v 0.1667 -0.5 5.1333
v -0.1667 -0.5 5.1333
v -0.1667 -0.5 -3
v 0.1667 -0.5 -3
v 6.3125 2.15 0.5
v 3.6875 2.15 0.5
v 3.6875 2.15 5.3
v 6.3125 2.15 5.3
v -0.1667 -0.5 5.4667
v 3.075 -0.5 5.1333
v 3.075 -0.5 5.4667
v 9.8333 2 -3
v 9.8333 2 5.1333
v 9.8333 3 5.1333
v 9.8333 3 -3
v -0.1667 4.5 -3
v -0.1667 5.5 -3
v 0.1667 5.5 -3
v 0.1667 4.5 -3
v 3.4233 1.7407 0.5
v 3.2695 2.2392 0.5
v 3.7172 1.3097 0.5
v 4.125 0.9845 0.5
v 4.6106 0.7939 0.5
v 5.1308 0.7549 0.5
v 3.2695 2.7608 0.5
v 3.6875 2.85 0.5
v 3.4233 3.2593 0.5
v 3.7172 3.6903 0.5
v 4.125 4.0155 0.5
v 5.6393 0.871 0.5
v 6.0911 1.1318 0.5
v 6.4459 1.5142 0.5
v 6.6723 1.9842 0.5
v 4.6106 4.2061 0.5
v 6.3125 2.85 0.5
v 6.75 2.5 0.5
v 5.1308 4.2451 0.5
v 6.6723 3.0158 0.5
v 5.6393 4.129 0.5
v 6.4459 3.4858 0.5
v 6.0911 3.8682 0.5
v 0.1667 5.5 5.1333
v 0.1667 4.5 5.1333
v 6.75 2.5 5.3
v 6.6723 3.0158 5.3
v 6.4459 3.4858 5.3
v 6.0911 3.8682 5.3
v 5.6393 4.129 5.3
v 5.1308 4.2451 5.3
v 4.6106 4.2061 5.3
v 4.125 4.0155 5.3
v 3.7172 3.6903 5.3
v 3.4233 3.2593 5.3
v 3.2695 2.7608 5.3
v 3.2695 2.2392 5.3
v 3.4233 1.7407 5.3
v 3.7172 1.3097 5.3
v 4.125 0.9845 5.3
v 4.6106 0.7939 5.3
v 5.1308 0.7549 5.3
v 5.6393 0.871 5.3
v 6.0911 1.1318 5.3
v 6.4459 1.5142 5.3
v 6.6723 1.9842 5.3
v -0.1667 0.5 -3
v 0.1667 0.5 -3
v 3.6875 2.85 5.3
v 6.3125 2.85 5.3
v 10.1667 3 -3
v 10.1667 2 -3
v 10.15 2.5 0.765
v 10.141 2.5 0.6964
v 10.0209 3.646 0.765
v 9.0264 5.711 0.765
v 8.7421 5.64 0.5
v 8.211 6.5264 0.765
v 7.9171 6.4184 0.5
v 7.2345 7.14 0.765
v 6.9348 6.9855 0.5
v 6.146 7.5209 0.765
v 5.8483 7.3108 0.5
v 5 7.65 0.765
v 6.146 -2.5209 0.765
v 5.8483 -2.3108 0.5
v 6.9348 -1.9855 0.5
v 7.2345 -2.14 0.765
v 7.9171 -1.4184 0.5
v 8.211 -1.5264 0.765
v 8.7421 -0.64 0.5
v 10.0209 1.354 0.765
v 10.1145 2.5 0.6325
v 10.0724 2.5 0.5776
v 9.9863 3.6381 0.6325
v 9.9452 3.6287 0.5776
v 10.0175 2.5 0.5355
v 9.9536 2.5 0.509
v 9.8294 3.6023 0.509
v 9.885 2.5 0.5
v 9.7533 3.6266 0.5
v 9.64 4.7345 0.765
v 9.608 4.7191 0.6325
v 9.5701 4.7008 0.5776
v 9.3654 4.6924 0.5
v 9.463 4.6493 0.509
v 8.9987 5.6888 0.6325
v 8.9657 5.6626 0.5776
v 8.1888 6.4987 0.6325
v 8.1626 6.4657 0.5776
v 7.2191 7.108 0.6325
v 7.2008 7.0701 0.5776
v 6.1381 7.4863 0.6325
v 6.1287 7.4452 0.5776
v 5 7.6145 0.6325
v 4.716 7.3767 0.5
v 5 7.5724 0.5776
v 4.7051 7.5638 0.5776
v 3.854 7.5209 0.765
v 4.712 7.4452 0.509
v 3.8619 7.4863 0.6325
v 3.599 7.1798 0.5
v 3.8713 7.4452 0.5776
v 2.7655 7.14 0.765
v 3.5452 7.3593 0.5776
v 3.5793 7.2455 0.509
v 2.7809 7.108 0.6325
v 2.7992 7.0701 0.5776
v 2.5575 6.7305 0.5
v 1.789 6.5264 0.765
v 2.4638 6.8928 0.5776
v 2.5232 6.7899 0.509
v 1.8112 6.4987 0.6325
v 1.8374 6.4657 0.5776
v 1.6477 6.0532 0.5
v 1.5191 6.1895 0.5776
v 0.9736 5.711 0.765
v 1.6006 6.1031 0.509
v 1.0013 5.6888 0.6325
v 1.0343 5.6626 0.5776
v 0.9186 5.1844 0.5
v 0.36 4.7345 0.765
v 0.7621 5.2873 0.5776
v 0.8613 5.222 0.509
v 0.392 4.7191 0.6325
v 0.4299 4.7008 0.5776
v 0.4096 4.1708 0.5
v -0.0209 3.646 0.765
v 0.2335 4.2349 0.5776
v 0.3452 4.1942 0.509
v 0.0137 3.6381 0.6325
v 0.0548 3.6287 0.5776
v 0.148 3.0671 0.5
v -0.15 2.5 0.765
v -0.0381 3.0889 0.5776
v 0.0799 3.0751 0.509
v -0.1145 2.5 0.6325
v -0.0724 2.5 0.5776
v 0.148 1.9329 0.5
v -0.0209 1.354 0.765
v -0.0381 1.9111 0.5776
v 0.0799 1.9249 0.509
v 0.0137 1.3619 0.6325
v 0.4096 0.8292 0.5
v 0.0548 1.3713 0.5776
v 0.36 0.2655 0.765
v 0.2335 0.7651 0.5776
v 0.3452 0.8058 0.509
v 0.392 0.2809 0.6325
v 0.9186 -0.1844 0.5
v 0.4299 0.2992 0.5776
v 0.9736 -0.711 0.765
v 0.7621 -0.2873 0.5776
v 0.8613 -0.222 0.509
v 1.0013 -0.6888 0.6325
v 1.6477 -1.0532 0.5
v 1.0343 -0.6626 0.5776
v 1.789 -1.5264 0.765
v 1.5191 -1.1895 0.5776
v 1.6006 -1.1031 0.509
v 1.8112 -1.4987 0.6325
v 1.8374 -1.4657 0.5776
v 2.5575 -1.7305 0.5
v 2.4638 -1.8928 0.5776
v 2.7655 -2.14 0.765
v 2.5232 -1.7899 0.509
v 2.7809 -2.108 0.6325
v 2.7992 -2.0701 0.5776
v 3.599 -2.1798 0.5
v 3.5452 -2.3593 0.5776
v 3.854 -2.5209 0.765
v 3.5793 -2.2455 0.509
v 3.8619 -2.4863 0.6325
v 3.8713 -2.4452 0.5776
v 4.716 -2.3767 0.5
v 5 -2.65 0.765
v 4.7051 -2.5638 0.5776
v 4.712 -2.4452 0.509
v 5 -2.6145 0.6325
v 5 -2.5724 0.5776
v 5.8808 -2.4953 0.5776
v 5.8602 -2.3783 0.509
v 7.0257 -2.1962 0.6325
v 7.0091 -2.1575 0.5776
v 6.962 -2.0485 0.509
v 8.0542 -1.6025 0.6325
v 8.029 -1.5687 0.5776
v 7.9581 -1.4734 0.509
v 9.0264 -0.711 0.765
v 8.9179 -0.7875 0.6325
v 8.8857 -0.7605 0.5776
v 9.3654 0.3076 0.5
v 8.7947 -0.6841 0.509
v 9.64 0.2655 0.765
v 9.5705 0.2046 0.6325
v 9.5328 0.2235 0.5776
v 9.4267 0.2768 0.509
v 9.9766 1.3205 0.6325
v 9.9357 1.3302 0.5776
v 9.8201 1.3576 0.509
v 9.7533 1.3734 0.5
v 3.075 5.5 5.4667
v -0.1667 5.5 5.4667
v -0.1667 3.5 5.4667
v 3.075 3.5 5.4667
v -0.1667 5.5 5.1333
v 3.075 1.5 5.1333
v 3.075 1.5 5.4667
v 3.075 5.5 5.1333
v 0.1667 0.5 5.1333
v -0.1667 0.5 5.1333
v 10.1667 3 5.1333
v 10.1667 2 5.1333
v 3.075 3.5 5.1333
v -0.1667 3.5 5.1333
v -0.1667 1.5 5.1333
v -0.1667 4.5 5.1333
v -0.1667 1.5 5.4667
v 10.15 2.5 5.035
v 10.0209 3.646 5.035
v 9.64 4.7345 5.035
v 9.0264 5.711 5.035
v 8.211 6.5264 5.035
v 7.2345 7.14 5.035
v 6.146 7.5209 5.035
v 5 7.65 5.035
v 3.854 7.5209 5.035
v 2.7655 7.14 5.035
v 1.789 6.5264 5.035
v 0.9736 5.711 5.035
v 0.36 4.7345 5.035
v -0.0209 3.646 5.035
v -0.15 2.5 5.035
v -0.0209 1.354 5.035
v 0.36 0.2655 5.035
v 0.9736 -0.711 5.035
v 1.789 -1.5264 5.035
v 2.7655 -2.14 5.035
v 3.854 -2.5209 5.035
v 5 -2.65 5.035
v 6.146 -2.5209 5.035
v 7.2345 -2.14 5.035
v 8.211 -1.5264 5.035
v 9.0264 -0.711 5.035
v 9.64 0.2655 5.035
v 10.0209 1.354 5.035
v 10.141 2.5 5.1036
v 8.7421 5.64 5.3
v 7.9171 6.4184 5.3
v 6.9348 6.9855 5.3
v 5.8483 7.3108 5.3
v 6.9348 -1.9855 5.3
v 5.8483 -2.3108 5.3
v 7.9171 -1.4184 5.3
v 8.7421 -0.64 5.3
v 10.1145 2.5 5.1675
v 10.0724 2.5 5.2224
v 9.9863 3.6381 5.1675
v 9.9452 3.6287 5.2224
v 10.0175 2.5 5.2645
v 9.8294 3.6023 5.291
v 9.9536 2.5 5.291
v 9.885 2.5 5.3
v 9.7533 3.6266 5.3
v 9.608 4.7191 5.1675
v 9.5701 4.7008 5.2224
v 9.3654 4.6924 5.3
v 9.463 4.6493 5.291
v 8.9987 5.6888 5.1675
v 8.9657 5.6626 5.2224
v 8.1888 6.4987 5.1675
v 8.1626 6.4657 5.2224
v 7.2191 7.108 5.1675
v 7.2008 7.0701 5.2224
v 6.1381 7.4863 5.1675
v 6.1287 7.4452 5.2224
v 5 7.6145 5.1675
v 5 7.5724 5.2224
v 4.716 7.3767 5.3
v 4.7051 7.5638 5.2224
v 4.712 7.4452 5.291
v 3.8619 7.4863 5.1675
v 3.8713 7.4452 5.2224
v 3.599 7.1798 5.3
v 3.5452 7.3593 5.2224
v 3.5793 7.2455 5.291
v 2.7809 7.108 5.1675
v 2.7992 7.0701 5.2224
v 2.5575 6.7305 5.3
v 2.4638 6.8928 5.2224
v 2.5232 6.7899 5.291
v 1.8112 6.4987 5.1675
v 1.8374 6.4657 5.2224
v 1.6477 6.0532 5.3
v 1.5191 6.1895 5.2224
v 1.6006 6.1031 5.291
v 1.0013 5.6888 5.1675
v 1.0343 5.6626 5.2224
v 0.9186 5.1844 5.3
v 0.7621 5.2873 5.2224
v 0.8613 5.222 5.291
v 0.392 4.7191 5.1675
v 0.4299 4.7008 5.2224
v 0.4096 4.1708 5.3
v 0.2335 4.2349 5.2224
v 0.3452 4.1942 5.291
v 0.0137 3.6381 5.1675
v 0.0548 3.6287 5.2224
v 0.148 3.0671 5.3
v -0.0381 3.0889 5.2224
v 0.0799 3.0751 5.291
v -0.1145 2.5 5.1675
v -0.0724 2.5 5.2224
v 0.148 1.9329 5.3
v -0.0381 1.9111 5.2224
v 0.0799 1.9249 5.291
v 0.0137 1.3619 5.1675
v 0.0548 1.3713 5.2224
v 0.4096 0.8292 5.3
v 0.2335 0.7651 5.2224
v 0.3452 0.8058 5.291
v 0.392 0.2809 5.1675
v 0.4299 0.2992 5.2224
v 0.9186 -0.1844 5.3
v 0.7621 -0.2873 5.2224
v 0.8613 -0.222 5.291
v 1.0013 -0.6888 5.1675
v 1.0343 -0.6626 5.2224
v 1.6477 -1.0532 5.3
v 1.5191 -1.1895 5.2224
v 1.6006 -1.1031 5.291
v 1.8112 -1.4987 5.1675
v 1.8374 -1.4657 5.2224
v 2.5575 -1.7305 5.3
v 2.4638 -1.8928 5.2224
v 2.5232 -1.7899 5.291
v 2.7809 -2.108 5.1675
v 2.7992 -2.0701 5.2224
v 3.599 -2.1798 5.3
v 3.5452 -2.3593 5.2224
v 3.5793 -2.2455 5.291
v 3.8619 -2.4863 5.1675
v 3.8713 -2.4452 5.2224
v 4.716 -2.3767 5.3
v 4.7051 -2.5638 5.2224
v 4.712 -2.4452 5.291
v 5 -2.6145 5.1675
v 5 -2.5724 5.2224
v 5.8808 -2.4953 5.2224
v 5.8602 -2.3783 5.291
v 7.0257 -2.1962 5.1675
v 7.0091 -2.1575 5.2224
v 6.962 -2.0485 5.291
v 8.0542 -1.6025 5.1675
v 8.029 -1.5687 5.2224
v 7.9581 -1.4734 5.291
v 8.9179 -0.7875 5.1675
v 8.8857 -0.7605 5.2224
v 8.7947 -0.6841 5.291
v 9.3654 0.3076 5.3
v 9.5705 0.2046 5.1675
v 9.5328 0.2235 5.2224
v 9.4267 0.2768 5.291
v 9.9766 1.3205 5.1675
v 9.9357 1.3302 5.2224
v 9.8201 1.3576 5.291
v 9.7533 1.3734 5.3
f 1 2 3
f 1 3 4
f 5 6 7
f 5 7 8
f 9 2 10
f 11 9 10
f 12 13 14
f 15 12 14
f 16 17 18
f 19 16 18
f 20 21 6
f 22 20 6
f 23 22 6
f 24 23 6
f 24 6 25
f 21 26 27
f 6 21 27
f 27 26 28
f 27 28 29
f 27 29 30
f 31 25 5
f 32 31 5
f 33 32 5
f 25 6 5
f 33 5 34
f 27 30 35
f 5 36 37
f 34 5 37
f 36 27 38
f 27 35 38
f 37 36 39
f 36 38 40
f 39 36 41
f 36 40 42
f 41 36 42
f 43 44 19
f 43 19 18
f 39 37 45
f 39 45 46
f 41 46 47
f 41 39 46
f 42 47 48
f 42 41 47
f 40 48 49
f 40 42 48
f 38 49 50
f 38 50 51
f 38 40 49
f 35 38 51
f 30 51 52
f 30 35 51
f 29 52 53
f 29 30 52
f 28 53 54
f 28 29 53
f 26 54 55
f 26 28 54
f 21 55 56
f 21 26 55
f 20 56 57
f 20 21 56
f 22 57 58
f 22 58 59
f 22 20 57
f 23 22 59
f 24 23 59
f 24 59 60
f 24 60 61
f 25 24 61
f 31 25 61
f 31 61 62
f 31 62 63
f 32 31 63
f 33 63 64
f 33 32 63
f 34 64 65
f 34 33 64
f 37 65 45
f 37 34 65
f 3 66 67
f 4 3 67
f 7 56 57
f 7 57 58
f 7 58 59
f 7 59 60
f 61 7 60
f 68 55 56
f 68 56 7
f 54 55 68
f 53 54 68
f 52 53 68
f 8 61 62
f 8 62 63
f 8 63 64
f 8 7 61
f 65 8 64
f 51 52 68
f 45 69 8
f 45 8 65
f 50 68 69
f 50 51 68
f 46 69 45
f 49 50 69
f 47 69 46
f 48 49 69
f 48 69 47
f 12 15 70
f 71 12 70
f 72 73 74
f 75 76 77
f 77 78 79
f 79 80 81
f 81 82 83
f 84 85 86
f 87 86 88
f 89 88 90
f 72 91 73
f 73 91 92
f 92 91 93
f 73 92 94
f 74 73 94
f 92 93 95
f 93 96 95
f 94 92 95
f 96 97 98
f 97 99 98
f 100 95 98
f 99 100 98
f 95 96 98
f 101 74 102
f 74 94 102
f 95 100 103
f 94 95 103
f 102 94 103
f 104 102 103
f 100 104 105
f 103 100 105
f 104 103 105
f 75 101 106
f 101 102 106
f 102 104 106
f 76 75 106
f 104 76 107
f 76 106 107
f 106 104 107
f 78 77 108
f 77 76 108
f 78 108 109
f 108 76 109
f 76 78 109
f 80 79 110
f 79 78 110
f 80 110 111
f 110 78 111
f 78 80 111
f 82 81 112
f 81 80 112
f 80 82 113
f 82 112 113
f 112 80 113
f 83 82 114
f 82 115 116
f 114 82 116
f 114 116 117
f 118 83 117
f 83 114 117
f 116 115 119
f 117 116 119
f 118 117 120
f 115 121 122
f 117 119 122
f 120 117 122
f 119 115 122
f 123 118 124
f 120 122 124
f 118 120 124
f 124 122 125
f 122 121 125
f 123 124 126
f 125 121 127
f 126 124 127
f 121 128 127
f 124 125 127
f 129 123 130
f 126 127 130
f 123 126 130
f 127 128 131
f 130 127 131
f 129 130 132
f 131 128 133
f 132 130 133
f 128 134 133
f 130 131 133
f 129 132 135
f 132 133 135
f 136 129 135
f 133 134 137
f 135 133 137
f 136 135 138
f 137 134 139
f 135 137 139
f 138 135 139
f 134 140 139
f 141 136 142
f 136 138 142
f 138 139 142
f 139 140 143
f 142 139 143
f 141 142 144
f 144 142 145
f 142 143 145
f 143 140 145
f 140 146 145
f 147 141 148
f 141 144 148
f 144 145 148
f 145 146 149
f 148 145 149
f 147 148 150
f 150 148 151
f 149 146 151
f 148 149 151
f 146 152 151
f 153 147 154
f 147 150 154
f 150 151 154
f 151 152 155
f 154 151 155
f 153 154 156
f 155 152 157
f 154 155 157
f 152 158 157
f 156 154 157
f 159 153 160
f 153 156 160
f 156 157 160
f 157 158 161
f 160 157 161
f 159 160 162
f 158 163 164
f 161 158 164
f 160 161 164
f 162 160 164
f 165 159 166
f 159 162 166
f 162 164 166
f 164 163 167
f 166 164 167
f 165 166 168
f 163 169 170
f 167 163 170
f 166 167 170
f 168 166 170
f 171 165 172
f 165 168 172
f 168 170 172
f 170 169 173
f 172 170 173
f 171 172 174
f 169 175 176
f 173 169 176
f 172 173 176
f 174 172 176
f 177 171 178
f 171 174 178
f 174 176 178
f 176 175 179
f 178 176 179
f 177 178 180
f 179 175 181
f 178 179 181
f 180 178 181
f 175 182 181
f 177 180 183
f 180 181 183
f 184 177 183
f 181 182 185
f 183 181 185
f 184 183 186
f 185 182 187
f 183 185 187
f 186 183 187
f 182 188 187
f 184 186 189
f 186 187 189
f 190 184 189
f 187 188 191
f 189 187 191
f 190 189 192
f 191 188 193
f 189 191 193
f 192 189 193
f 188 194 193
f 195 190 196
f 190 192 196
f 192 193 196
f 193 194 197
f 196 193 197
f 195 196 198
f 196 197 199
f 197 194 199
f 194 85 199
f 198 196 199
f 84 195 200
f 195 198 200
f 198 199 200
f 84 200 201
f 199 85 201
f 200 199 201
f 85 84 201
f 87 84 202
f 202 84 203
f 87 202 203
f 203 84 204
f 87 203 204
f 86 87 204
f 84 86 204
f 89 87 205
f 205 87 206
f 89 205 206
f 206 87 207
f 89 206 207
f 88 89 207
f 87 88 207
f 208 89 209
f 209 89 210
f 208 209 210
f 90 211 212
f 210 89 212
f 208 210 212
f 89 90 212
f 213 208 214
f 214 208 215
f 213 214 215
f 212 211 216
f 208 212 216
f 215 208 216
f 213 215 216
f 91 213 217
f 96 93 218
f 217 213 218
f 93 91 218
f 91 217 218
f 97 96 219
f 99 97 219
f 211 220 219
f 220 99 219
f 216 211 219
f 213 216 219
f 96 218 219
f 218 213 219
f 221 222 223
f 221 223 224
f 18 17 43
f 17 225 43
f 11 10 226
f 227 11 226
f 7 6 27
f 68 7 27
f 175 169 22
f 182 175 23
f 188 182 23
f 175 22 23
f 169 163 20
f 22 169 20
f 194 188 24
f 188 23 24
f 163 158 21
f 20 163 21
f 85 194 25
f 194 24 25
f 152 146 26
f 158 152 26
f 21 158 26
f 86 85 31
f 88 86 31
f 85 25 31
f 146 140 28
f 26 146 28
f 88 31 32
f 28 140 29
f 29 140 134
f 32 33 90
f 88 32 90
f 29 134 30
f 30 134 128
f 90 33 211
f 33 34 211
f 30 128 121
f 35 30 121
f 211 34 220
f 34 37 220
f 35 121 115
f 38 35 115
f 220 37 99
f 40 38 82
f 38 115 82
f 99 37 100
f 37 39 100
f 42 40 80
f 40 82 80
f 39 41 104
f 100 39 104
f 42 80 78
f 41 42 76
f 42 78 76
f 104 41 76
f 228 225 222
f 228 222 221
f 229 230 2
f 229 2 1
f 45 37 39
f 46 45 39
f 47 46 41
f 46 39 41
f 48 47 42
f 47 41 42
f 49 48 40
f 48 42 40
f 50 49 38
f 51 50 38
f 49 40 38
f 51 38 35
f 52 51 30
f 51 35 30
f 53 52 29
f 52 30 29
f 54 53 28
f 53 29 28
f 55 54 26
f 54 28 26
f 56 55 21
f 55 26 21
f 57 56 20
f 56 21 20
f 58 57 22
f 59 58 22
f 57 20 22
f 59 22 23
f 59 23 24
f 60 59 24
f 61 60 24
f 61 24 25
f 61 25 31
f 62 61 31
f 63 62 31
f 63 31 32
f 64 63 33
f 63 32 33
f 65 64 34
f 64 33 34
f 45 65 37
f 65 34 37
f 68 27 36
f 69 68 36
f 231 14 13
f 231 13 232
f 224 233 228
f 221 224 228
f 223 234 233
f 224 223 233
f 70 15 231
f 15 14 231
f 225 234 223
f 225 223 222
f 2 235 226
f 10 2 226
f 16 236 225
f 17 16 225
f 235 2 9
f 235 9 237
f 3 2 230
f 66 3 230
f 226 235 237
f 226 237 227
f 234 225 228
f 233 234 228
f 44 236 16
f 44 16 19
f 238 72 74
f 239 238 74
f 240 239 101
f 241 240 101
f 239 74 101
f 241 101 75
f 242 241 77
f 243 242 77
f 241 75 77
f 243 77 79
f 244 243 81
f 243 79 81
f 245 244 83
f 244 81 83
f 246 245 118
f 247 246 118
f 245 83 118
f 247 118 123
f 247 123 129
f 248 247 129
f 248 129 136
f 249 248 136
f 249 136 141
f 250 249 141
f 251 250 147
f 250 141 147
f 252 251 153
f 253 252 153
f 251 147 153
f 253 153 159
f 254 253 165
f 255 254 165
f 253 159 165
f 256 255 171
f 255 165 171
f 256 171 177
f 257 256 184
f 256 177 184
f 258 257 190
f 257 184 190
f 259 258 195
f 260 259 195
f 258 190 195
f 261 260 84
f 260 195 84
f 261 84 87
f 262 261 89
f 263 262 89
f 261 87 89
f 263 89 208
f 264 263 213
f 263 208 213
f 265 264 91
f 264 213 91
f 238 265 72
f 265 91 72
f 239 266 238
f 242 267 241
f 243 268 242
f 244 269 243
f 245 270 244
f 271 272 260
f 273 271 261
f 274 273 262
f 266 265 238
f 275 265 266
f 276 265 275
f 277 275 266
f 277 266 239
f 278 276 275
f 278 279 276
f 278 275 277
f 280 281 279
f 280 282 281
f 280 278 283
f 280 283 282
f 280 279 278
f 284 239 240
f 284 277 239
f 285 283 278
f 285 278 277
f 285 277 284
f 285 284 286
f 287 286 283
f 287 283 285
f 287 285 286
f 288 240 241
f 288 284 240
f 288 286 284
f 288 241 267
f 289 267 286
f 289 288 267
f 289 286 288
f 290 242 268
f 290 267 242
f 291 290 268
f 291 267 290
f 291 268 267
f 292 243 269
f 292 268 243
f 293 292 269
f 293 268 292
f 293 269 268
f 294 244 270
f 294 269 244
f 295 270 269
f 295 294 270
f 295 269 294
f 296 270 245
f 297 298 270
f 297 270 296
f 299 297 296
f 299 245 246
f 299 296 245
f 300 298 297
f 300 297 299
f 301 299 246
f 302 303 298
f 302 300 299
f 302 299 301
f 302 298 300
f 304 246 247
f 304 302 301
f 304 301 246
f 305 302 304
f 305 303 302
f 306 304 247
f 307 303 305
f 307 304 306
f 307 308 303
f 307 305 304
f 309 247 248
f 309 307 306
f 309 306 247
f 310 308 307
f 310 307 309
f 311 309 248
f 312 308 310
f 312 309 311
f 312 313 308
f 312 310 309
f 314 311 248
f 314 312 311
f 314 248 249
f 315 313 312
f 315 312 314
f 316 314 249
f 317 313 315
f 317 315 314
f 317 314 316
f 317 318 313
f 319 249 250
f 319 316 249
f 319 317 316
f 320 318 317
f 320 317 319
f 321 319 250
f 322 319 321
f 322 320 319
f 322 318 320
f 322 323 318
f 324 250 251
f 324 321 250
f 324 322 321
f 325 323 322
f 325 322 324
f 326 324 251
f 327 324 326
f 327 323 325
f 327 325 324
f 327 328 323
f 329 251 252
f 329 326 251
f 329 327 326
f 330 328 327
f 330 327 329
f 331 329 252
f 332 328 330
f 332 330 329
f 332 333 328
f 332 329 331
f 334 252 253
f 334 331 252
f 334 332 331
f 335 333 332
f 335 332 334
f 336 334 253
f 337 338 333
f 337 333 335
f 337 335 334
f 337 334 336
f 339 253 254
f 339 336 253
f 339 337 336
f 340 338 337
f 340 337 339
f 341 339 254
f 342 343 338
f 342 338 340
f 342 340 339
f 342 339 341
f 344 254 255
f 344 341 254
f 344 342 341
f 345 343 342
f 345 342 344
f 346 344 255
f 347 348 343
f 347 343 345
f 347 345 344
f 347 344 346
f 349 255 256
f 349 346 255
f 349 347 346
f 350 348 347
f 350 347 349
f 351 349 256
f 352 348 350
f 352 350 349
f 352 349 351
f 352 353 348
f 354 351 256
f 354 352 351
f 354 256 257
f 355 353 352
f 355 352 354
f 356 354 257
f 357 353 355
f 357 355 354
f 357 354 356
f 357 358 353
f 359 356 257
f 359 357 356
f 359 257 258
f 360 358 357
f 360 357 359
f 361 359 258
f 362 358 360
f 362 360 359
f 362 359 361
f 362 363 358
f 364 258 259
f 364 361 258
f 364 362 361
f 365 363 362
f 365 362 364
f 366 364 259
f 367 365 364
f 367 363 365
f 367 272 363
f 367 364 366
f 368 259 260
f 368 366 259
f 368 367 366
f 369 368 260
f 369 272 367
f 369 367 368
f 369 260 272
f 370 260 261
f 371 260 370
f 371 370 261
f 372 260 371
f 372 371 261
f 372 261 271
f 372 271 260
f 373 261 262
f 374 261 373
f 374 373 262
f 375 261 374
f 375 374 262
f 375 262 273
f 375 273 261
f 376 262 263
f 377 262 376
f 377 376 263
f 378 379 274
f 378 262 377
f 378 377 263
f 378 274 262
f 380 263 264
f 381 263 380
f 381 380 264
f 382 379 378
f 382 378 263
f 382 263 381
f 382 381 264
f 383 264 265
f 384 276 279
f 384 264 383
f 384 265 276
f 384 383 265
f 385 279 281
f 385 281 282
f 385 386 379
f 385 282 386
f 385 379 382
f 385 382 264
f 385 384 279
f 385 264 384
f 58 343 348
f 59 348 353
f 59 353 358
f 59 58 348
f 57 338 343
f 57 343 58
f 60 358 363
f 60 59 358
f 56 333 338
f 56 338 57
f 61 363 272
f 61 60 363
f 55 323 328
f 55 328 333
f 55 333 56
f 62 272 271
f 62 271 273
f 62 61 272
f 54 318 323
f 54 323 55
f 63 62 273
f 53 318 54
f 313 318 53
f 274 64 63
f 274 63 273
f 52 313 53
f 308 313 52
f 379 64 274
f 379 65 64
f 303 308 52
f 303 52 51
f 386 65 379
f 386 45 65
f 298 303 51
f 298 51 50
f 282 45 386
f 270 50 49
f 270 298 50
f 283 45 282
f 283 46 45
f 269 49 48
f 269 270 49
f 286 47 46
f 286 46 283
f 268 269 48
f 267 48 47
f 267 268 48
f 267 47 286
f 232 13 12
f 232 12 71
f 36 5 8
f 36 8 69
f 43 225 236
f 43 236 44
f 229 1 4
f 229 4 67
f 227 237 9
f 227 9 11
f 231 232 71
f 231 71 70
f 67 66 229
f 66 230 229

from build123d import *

# Parameters (mm, degrees)
SKETCH003_W       = 0.333334
SKETCH003_H       = 1
PAD002_DEPTH      = 5.133333
PAD002_DEPTH_BACK = 3
SKETCH004_R       = 1.75
SKETCH004_W       = 2.625
SKETCH004_H       = 0.7
PAD003_DEPTH      = 4.8
SKETCH_R          = 5.15
SKETCH_R_2        = 1.75
PAD_DEPTH         = 4.8
FILLET_R          = 0.265
SKETCH005_W       = 3.241667
SKETCH005_H       = 2
PAD004_DEPTH      = 0.333333


with BuildPart() as pad002:
    # Sketch003 → Pad002 (new body, two sides)
    with BuildSketch(Plane(origin=(0, 5, 0), x_dir=(1, 0, 0), z_dir=(0, 0, 1))) as pad002_sk:
        Rectangle(SKETCH003_W, SKETCH003_H)
        with Locations((10, -2.5)):
            Rectangle(SKETCH003_W, SKETCH003_H)
        with Locations((0, -5)):
            Rectangle(SKETCH003_W, SKETCH003_H)
    extrude(amount=PAD002_DEPTH)
    extrude(pad002_sk.sketch, amount=-PAD002_DEPTH_BACK)


with BuildPart() as pad003:
    # Sketch004 → Pad003 (new body)
    with BuildSketch(Plane(origin=(0, 5, 0.5), x_dir=(1, 0, 0), z_dir=(0, 0, 1))):
        with Locations((5, -2.5)):
            Circle(SKETCH004_R)
        with Locations((5, -2.5)):
            Rectangle(SKETCH004_W, SKETCH004_H, mode=Mode.SUBTRACT)
    extrude(amount=PAD003_DEPTH)


with BuildPart() as fillet_body:
    # Sketch → Pad (new body)
    with BuildSketch(Plane(origin=(0, 5, 0.5), x_dir=(1, 0, 0), z_dir=(0, 0, 1))):
        with Locations((5, -2.5)):
            Circle(SKETCH_R)
        with Locations((5, -2.5)):
            Circle(SKETCH_R_2, mode=Mode.SUBTRACT)
    extrude(amount=PAD_DEPTH)

    # Fillet
    fillet_edges = [fillet_body.edges().sort_by_distance(p)[0] for p in [
        (-0.15, 2.5, 0.5),
        (-0.15, 2.5, 5.3),
    ]]
    fillet(fillet_edges, radius=FILLET_R)


with BuildPart() as pad004:
    # Sketch005 → Pad004 (new body)
    with BuildSketch(Plane(origin=(0, 5, 5.133333), x_dir=(1, 0, 0), z_dir=(0, 0, 1))):
        with Locations((1.454166, -0.5)):
            Rectangle(SKETCH005_W, SKETCH005_H)
        with Locations((1.454166, -4.5)):
            Rectangle(SKETCH005_W, SKETCH005_H)
    extrude(amount=PAD004_DEPTH)


solid = Compound([pad002.part, pad003.part, fillet_body.part, pad004.part])
